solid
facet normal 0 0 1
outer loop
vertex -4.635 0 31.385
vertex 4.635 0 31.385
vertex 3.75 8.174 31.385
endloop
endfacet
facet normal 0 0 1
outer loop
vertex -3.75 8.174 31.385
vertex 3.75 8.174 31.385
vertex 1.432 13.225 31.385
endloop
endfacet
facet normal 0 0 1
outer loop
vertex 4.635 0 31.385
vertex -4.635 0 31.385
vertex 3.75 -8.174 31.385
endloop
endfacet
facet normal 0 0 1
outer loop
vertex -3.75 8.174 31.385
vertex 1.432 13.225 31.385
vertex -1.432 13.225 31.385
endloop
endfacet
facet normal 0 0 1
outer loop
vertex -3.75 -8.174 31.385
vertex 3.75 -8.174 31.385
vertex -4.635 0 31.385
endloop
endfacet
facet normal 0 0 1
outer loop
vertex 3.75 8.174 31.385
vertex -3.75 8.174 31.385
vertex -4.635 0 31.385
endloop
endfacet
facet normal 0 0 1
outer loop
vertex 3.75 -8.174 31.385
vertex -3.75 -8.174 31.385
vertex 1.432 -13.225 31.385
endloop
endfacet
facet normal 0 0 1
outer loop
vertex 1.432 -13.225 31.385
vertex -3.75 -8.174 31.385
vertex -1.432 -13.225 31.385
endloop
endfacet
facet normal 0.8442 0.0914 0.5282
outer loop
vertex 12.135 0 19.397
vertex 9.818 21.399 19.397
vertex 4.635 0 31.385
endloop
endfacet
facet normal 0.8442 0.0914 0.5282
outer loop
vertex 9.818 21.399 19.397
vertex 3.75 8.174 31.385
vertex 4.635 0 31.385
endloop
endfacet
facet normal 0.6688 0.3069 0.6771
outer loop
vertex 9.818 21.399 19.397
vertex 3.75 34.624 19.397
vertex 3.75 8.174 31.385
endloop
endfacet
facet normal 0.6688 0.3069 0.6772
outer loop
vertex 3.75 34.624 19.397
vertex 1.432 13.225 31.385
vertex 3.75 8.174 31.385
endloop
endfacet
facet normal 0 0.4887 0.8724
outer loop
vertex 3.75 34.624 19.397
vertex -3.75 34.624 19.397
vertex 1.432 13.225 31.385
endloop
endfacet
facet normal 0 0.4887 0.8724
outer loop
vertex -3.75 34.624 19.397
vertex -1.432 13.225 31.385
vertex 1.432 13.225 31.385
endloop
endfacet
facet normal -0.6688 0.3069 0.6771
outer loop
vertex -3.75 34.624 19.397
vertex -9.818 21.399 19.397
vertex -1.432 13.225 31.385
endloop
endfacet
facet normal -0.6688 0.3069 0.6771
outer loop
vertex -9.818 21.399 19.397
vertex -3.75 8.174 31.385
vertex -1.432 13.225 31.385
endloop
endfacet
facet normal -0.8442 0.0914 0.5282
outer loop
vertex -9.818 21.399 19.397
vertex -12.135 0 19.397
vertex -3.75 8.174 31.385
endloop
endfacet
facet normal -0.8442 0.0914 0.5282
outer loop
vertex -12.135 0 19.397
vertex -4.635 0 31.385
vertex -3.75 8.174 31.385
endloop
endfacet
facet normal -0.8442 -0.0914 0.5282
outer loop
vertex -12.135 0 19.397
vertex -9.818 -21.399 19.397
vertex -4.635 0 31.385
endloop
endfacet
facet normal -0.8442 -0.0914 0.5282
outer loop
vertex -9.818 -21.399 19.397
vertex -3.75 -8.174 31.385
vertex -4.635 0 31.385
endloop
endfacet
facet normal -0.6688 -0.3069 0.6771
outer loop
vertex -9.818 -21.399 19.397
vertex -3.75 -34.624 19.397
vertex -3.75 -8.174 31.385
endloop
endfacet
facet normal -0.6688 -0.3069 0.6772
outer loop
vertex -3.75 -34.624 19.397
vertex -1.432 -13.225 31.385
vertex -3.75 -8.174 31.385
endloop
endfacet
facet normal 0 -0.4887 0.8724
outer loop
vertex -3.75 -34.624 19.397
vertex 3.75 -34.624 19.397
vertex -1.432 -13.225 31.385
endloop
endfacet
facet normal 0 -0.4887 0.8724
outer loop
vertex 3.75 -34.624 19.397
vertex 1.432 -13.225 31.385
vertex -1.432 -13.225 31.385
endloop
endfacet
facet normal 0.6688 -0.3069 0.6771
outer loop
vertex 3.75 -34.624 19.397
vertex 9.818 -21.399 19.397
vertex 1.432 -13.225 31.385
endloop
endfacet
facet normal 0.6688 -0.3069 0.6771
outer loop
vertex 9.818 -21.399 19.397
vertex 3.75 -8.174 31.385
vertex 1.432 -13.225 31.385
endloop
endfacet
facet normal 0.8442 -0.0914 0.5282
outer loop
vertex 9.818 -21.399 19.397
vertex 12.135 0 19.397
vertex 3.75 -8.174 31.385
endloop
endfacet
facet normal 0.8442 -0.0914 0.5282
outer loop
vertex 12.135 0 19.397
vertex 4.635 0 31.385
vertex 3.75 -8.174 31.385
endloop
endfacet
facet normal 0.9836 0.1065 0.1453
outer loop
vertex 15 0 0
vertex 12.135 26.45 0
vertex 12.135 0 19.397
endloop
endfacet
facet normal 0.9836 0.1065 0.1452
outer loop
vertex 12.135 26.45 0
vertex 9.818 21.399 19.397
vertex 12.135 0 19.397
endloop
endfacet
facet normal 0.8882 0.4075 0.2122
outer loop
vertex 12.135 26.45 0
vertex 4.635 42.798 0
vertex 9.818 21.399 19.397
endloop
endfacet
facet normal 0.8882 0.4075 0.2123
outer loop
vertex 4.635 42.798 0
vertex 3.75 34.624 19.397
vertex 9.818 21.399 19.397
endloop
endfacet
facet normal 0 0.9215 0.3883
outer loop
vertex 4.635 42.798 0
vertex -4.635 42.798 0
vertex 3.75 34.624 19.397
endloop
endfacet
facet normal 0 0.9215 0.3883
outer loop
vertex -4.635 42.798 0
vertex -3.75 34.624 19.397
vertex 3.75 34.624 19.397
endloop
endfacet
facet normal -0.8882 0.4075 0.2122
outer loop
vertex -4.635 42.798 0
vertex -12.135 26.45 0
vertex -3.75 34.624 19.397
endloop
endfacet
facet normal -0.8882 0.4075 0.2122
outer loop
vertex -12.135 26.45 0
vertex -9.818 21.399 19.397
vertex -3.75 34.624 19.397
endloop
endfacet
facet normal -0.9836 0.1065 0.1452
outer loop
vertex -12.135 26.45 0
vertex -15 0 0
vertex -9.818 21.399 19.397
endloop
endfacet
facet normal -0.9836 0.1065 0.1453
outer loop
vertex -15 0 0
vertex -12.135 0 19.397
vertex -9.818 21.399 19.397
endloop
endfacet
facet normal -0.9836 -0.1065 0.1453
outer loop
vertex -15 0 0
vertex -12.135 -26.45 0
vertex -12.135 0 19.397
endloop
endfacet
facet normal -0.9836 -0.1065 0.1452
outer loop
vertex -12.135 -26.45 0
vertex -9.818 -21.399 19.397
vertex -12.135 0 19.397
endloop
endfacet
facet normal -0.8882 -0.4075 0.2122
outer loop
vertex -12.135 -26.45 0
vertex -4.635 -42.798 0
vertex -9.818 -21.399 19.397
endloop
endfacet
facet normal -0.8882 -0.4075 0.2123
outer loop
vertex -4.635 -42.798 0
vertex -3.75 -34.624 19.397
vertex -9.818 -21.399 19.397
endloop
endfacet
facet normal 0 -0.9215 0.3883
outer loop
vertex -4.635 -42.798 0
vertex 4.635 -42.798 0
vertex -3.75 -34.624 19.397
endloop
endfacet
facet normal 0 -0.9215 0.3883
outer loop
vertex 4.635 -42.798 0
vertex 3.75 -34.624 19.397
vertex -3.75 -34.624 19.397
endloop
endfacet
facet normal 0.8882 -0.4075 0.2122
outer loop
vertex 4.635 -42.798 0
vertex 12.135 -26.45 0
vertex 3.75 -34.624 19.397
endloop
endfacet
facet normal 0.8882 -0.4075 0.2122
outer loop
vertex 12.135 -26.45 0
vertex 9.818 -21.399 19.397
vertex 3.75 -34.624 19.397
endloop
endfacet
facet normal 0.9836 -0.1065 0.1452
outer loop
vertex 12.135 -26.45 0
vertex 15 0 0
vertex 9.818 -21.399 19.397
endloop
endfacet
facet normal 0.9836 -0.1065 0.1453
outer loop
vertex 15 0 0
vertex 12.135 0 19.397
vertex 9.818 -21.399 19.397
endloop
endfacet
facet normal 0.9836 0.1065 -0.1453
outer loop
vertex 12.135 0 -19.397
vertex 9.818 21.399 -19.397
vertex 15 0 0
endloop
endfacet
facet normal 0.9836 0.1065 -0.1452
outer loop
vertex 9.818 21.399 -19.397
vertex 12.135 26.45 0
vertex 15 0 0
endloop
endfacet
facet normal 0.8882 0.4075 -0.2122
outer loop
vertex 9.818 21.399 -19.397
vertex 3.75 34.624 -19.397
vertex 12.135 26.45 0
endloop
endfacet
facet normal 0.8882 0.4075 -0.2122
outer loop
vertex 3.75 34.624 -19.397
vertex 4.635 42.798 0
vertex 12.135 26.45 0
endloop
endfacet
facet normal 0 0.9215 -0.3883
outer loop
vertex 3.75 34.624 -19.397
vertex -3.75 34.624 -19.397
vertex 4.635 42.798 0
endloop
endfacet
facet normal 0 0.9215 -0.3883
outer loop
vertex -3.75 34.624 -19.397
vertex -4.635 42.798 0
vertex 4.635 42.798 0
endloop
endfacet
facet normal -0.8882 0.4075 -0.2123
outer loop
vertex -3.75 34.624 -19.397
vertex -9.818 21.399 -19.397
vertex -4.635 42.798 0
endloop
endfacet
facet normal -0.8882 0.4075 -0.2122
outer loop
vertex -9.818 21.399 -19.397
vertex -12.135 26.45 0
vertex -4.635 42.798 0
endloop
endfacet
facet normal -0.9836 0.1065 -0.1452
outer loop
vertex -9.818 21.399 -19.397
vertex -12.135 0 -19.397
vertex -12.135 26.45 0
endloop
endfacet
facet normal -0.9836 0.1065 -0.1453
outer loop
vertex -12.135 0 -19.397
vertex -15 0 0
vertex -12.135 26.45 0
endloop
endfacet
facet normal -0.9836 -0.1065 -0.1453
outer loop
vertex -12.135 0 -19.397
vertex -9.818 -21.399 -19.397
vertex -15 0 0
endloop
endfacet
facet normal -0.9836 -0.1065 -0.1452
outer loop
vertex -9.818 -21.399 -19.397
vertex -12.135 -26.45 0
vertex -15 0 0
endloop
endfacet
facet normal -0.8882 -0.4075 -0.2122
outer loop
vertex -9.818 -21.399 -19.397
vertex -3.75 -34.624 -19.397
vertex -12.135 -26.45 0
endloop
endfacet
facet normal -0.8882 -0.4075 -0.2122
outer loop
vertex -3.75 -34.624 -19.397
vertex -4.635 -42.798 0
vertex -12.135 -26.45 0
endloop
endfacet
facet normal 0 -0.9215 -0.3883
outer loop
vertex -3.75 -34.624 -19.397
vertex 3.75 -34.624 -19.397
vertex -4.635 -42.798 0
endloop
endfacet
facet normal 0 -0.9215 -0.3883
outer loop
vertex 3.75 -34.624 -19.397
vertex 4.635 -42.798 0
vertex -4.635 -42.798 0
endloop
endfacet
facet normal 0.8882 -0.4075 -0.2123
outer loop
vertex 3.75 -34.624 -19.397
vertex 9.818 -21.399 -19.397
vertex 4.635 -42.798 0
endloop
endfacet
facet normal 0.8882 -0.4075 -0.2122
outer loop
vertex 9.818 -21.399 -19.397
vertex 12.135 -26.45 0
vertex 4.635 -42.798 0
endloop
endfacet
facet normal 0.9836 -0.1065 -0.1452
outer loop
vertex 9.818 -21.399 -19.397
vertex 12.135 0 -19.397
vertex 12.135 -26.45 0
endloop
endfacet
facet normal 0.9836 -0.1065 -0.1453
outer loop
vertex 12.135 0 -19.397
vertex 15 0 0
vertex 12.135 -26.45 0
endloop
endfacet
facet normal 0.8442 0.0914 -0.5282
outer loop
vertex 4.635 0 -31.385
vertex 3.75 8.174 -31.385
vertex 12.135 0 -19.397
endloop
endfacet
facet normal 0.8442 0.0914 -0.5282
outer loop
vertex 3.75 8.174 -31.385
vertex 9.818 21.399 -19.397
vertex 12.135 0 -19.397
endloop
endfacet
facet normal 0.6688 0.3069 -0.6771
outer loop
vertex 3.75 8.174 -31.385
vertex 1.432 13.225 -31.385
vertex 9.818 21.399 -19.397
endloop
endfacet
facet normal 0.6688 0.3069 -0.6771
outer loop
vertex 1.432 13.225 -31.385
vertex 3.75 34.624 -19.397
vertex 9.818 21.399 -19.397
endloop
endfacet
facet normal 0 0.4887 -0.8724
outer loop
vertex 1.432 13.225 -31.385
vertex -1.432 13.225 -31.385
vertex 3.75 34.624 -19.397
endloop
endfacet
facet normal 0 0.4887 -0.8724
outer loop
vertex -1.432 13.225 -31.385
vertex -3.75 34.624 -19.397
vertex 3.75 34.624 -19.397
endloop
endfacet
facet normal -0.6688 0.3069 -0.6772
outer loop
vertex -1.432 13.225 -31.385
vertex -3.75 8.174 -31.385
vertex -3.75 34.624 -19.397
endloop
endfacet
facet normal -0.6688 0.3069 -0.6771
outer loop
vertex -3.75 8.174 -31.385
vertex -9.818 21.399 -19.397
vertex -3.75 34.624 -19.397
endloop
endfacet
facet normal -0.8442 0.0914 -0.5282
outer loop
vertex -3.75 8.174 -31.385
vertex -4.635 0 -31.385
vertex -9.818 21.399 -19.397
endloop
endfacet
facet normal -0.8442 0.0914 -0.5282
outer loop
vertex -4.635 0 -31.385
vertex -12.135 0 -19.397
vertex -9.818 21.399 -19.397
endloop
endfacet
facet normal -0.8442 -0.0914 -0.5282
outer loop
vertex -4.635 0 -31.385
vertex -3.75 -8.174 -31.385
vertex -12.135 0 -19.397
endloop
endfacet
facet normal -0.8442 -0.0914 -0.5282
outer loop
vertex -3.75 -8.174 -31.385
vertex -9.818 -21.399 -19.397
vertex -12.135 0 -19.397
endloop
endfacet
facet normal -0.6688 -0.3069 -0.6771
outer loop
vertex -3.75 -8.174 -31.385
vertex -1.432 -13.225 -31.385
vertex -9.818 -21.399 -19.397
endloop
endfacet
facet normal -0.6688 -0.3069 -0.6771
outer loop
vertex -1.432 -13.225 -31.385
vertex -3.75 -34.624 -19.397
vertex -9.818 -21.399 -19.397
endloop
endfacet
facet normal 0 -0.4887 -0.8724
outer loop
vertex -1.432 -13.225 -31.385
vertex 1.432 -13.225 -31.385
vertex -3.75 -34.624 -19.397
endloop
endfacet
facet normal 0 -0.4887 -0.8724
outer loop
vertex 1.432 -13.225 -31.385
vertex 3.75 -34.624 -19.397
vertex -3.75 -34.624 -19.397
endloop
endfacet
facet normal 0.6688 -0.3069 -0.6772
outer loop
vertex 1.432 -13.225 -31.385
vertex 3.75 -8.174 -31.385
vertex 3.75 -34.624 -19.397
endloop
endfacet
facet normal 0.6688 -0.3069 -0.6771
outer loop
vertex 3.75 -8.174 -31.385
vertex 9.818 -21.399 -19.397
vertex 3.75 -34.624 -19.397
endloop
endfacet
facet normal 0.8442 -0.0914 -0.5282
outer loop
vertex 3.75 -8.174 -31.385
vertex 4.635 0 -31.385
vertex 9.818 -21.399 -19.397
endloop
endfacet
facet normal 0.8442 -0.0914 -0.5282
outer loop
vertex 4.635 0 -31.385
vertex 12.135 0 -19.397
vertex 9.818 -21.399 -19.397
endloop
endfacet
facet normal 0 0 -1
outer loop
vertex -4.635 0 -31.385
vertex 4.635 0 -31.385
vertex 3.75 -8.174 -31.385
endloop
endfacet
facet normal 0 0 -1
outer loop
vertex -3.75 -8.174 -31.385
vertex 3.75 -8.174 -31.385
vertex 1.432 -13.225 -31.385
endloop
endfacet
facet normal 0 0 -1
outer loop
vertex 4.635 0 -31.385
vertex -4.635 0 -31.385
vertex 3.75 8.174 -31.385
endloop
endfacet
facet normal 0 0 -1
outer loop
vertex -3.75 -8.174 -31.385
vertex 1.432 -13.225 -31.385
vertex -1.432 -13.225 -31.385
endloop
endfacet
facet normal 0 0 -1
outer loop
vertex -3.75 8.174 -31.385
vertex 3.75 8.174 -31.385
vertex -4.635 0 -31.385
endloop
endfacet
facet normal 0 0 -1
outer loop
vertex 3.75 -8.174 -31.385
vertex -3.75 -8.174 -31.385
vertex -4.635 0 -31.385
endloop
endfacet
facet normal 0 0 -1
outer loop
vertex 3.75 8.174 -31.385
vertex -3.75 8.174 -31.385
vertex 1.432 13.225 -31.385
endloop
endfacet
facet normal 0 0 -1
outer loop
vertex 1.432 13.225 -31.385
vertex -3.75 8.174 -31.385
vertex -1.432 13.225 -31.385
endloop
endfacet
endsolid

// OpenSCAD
// Generated by SolidPython 1.0.1 on 2020-07-29 00:46:46


scale(v = [5, 15, 11]) {
	sphere(r = 3);
}
/***********************************************
*********      SolidPython code:      **********
************************************************
 
# import packages: SolidPython
from solid import *
from solid.utils import *
from itertools import chain, combinations, permutations


class Resize:

    def __init__(self, scad_file):
        self.scad_file = scad_file
        #self.scad_file = import_scad(scad_file)
        # cone/cylinder param:
        self.r1 = 0
        self.r2 = 0
        self.h = 0
        # rectangular prism param:
        self.w = 0
        self.l = 0
        # ellipse param:
        self.r = 0

    # import OpenScad code (file name corresponds to shape)


    # classify shape + parameters
    def assign(self, param1, param2, param3):
        if self.scad_file == 'cone.scad':
            self.r1 = param1
            self.r2 = param2
            self.h = param3
        elif self.scad_file == 'cylinder.scad':
            self.r1 = param1
            self.r2 = param2
            self.h = param3
        elif self.scad_file == 'rectangularPrism.scad':
            self.h = param1
            self.l = param2
            self.w = param3
        else:
            self.r = param1
            self.h = param2

    # resize parameters
    def iterate(self):
        x = range(3, 20, 2)
        i = 1
        if self.scad_file == 'cone.scad':
            tempList = list(permutations(x, 2))
            for temp in tempList:
                param1 = temp[0]
                param2 = temp[1]
                filepath = 'produced_scad_files/' + 'cone' + str(param1) + '_' + str(param2) + '_' + '.scad'
                scad_render_to_file(cylinder(h=param1, r1=param2, r2=0), filepath)

        elif self.scad_file == 'cylinder.scad':
            tempList = list(permutations(x, 3))
            for temp in tempList:
                param1 = temp[0]
                param2 = temp[1]
                filepath = 'produced_scad_files/' + 'cylinder' + str(param1) + '_' + str(param2) + '_' + '.scad'
                scad_render_to_file(cylinder(h=param1, r1=param2, r2=param2), filepath)

        elif self.scad_file == 'rectangularPrism.scad':
            tempList = list(permutations(x, 3))
            for temp in tempList:
                param1 = temp[0]
                param2 = temp[1]
                param3 = temp[2]
                filepath = 'produced_scad_files/' + 'rectangularPrism' + str(param1) + '_' + str(param2) + '_' + str(
                    param3) + '.scad'
                scad_render_to_file(cube(size=(param1, param2, param3)), filepath)

        elif self.scad_file == 'ellipse.scad':
            tempList = list(permutations(x, 4))
            for temp in tempList:
                param1 = temp[0]
                param2 = temp[1]
                param3 = temp[2]
                param4 = temp[3]
                filepath = 'produced_scad_files/' + 'ellipse' + str(param1) + '_' + str(param2) + '_' + str(param3) + '_' + str(param4) + '.scad'
                scad_render_to_file(scale([param1, param2, param3])(sphere(r=param4)), filepath)

    def render_to_scadfile(self):
        scad_render_to_file(scad, 'example.scad') 
 
************************************************/
